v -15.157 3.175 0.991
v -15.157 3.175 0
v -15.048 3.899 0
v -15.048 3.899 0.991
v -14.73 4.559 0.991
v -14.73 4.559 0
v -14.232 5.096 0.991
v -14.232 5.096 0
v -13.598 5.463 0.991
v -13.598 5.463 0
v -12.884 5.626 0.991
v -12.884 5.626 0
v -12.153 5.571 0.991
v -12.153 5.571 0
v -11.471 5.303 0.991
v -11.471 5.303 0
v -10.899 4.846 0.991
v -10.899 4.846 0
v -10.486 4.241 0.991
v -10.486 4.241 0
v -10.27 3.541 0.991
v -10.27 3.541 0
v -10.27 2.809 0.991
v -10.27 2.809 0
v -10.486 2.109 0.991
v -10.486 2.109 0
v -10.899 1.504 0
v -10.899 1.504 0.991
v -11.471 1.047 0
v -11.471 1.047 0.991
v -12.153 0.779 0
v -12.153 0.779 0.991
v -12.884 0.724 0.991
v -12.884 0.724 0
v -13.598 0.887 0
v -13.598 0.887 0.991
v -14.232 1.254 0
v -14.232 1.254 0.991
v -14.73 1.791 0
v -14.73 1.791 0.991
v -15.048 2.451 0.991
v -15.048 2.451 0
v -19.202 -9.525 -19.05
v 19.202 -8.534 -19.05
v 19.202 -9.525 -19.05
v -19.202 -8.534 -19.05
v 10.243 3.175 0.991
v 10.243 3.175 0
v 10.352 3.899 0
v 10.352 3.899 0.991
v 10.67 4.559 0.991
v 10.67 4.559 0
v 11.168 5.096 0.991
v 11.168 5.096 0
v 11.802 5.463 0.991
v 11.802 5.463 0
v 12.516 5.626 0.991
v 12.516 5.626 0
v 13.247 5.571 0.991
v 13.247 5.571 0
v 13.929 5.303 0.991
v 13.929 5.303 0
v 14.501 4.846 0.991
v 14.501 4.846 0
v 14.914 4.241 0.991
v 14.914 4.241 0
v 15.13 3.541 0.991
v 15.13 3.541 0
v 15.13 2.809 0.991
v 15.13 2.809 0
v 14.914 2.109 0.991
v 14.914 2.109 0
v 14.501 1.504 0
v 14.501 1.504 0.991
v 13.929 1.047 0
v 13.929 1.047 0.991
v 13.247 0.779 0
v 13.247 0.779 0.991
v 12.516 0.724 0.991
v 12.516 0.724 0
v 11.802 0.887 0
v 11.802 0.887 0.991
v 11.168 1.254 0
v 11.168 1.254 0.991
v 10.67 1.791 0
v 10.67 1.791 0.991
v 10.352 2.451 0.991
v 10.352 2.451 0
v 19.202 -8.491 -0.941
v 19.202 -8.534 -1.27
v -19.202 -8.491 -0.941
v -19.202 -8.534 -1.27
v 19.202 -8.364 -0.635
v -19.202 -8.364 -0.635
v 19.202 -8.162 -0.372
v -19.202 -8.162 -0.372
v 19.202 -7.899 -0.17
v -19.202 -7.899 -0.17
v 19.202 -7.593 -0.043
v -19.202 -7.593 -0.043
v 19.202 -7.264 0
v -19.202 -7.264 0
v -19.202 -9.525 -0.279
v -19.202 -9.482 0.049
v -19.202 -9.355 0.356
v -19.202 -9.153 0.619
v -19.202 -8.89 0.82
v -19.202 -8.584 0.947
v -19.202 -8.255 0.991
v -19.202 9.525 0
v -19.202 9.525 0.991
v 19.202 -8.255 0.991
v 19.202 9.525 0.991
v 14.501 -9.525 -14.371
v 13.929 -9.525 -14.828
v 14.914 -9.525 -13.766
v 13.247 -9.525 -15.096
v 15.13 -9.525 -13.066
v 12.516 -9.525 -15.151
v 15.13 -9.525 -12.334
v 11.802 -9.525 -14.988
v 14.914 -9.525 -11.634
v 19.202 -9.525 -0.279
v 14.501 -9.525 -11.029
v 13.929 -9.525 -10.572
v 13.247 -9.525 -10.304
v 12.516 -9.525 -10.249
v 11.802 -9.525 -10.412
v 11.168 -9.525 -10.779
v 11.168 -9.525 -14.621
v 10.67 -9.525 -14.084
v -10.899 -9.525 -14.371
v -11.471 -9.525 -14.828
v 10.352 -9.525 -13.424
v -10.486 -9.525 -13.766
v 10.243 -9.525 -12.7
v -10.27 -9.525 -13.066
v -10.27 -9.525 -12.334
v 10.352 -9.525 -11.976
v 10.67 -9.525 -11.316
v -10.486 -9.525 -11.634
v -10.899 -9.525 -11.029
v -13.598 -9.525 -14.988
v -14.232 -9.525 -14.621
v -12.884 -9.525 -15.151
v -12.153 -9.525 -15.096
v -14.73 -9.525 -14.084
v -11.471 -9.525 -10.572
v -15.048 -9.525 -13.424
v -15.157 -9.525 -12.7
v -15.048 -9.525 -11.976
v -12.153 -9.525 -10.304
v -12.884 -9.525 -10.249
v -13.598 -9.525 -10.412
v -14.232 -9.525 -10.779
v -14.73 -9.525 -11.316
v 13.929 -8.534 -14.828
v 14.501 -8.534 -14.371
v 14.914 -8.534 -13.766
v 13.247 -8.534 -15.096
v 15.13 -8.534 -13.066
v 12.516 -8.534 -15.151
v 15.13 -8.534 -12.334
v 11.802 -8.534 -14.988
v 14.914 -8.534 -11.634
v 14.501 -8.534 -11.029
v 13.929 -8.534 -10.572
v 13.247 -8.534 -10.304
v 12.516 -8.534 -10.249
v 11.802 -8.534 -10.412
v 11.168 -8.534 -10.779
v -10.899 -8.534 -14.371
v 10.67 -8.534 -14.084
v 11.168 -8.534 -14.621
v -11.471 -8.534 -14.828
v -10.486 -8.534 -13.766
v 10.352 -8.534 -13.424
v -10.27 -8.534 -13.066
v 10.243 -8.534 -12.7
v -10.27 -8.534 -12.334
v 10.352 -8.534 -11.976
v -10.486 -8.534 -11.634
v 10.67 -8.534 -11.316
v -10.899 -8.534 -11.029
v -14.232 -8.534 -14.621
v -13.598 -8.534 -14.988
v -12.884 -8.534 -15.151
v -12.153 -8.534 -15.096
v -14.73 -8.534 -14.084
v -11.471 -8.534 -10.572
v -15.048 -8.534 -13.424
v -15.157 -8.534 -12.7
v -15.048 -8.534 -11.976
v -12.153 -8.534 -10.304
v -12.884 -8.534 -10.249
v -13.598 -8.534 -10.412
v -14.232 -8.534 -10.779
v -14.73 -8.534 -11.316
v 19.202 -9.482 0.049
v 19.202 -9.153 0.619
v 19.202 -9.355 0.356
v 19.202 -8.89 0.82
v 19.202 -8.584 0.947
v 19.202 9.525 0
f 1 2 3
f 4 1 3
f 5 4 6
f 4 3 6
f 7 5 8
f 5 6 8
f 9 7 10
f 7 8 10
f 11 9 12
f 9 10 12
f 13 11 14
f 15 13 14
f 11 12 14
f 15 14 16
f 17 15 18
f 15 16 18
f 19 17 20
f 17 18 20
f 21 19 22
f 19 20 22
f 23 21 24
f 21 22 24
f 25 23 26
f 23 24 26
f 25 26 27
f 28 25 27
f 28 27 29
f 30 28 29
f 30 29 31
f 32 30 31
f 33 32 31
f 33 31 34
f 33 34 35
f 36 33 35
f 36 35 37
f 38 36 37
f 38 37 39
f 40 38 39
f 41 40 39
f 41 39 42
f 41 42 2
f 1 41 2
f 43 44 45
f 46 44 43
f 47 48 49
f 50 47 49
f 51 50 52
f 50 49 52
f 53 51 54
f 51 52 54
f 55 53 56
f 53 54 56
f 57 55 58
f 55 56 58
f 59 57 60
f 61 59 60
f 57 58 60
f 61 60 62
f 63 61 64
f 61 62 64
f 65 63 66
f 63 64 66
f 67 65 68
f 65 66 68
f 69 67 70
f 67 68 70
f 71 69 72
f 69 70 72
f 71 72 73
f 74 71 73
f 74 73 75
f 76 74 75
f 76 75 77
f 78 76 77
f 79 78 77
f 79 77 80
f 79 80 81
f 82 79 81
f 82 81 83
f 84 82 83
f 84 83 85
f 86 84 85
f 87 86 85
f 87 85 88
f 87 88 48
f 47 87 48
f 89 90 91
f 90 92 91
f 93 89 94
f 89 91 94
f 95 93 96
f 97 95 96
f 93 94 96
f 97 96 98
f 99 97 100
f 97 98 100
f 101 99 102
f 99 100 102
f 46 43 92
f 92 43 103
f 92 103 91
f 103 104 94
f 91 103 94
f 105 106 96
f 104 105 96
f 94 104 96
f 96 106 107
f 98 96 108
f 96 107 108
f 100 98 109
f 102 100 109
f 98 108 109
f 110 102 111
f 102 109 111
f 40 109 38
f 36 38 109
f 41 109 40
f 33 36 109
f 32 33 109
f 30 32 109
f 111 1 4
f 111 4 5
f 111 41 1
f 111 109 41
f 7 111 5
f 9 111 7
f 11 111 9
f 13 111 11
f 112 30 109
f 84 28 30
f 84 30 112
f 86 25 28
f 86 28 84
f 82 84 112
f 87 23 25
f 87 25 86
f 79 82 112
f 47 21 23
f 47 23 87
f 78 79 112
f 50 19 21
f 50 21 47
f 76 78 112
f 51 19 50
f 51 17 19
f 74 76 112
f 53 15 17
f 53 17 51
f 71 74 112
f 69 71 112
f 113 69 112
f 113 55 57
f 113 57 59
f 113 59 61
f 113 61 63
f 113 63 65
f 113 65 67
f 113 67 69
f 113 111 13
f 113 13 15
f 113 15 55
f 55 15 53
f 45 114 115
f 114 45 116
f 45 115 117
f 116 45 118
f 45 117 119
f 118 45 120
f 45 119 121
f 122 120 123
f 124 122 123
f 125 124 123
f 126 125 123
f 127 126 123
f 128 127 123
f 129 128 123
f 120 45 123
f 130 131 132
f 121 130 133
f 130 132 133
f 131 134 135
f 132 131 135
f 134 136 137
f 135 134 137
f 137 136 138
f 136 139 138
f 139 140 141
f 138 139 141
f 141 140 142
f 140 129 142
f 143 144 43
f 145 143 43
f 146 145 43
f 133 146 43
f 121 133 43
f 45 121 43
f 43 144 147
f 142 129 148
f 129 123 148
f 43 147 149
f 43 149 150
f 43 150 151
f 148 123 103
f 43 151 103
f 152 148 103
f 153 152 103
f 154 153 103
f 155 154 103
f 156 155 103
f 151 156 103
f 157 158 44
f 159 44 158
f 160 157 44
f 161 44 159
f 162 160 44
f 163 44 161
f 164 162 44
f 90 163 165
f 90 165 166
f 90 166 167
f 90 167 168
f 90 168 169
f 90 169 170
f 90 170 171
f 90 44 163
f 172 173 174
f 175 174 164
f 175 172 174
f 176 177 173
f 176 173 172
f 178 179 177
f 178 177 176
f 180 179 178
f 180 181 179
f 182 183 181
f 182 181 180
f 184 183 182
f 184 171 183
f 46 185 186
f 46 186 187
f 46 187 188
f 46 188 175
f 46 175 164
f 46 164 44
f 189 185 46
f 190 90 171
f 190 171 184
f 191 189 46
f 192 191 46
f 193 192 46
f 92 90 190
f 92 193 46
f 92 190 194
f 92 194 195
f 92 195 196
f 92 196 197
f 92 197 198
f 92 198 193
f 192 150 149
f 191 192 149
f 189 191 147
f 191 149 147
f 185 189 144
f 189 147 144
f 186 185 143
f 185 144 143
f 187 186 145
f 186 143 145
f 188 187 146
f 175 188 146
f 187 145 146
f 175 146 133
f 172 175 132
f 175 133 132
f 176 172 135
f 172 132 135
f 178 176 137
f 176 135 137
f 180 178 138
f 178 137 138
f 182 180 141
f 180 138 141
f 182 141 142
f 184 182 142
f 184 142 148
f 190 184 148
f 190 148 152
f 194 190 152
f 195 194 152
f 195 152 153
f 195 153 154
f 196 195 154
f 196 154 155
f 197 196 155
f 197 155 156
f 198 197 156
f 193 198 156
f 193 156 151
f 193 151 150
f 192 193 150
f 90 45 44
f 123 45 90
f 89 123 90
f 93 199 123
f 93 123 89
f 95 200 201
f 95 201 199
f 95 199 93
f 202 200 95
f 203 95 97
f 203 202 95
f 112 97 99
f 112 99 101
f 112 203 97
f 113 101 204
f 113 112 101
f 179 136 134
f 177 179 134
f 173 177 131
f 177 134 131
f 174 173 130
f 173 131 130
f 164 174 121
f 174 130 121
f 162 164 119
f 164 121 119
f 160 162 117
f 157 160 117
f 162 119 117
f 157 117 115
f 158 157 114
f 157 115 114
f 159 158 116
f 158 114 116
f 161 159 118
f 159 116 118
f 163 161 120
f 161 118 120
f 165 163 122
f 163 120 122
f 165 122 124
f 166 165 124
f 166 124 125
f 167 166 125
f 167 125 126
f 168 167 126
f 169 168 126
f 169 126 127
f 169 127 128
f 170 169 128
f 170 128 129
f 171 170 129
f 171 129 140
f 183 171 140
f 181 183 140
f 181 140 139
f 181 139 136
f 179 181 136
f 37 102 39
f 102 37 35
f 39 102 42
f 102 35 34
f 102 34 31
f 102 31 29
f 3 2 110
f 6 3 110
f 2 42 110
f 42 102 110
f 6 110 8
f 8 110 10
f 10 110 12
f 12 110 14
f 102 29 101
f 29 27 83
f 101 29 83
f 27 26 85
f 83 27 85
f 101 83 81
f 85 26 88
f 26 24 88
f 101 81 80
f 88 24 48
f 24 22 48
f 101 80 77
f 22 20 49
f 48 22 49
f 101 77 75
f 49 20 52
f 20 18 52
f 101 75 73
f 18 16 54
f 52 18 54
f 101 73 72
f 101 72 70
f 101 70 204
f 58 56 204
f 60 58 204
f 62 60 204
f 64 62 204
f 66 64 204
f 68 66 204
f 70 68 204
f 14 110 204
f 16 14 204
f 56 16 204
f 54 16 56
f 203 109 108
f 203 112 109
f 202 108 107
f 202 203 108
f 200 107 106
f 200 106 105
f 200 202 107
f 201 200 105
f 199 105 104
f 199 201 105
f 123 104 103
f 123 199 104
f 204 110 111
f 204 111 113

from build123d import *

# Parameters (mm, degrees)
SKETCH1_W                    = 38.4048
SKETCH1_H                    = 19.05
BOSS_EXTRUDE1_DEPTH          = 0.9906
F_10_0_1935_DIAMETER_HOLE1_D = 4.9149
SKETCH5_W                    = 38.4048
SKETCH5_H                    = 0.9906
BOSS_EXTRUDE2_DEPTH          = 19.05
F_10_0_1935_DIAMETER_HOLE2_D = 4.9149
FILLET1_R                    = 1.27


with BuildPart() as part:
    # Sketch1 → Boss-Extrude1 (new body)
    with BuildSketch(Plane.XY):
        Rectangle(SKETCH1_W, SKETCH1_H)
    extrude(amount=BOSS_EXTRUDE1_DEPTH)

    # #10 (0.1935) Diameter Hole1 (through all)
    with Locations(Plane.XY.offset(0.9906)):
        with Locations((-12.7, 3.175), (12.7, 3.175)):
            Hole(F_10_0_1935_DIAMETER_HOLE1_D / 2)

    # Sketch5 → Boss-Extrude2 (add)
    with BuildSketch(Plane(origin=(0, 0, 0), x_dir=(-1, 0, 0), z_dir=(0, 0, -1))):
        with Locations((0, -9.0297)):
            Rectangle(SKETCH5_W, SKETCH5_H)
    extrude(amount=BOSS_EXTRUDE2_DEPTH)

    # #10 (0.1935) Diameter Hole2 (through all)
    with Locations(Plane(origin=(0, -8.5344, 0), x_dir=(1, 0, 0), z_dir=(0, 1, 0))):
        with Locations((-12.7, 12.7), (12.7, 12.7)):
            Hole(F_10_0_1935_DIAMETER_HOLE2_D / 2)

    # Fillet1
    fillet1_edges = [part.edges().sort_by_distance(p)[0] for p in [
        (0, -8.5344, 0),
        (0, -9.525, 0.9906),
    ]]
    fillet(fillet1_edges, radius=FILLET1_R)


solid = part.part
